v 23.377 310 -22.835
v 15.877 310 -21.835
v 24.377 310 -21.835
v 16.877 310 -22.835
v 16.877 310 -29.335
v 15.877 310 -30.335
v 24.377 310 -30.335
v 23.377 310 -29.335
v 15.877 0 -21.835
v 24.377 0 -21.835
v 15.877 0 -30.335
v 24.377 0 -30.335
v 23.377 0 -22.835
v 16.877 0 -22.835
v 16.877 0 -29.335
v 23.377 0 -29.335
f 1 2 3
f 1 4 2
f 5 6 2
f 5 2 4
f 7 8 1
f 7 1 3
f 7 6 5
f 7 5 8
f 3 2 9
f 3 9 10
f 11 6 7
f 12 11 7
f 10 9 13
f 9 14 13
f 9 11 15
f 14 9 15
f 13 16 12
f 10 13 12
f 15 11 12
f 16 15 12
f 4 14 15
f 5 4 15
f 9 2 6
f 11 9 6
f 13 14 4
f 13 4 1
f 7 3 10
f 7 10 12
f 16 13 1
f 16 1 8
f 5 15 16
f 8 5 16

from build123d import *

# Parameters (mm, degrees)
SKETCH1_W           = 8.5
SKETCH1_H           = 8.5
SKETCH1_W_2         = 6.5
SKETCH1_H_2         = 6.5
BOSS_EXTRUDE1_DEPTH = 310


with BuildPart() as part:
    # Sketch1 → Boss-Extrude1 (new body)
    with BuildSketch(Plane(origin=(0, 0, 0), x_dir=(1, 0, 0), z_dir=(0, 1, 0))):
        with Locations((20.126704545, 26.085227273)):
            Rectangle(SKETCH1_W, SKETCH1_H)
        with Locations((20.126704545, 26.085227273)):
            Rectangle(SKETCH1_W_2, SKETCH1_H_2, mode=Mode.SUBTRACT)
    extrude(amount=BOSS_EXTRUDE1_DEPTH)


solid = part.part
